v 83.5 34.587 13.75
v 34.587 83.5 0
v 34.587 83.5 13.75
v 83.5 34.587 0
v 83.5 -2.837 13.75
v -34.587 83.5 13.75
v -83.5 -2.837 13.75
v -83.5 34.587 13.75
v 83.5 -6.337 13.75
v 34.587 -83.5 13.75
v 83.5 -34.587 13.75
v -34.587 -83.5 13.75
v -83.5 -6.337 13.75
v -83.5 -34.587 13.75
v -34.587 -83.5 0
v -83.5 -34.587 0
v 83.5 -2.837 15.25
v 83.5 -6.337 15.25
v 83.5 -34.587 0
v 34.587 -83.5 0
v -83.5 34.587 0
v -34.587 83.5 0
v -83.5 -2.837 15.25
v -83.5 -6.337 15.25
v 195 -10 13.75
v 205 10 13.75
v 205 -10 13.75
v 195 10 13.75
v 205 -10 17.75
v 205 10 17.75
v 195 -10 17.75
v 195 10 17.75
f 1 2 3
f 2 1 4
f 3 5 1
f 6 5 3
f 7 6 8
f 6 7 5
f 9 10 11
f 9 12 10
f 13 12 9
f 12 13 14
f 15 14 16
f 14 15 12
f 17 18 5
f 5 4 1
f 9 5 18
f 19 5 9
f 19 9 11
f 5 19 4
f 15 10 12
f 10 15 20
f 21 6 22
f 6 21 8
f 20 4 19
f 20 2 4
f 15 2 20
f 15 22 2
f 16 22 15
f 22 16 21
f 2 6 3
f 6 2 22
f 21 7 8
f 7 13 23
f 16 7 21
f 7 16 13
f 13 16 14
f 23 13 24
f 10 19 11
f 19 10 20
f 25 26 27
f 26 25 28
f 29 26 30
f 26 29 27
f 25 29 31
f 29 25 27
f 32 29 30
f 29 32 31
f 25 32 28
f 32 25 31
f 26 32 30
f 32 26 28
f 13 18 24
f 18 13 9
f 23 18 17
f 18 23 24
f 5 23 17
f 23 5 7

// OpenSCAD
// Generated by DescriptiveCAD bootstrap v0.2
  // boundary visualization
  linear_extrude(height=13.75) polygon(points=[[-34.586832, 83.500000], [34.586832, 83.500000], [83.500000, 34.586832], [83.500000, -34.586832], [34.586832, -83.500000], [-34.586832, -83.500000], [-83.500000, -34.586832], [-83.500000, 34.586832]]);
  translate([0,0,13.75]) linear_extrude(height=4) polygon(points=[[195.000000, -10.000000], [205.000000, -10.000000], [205.000000, 10.000000], [195.000000, 10.000000]]);
  translate([0,0,13.75]) linear_extrude(height=1.5) polygon(points=[[83.500000, -2.836832], [-83.500000, -2.836832], [-83.500000, -6.336832], [83.500000, -6.336832]]);
